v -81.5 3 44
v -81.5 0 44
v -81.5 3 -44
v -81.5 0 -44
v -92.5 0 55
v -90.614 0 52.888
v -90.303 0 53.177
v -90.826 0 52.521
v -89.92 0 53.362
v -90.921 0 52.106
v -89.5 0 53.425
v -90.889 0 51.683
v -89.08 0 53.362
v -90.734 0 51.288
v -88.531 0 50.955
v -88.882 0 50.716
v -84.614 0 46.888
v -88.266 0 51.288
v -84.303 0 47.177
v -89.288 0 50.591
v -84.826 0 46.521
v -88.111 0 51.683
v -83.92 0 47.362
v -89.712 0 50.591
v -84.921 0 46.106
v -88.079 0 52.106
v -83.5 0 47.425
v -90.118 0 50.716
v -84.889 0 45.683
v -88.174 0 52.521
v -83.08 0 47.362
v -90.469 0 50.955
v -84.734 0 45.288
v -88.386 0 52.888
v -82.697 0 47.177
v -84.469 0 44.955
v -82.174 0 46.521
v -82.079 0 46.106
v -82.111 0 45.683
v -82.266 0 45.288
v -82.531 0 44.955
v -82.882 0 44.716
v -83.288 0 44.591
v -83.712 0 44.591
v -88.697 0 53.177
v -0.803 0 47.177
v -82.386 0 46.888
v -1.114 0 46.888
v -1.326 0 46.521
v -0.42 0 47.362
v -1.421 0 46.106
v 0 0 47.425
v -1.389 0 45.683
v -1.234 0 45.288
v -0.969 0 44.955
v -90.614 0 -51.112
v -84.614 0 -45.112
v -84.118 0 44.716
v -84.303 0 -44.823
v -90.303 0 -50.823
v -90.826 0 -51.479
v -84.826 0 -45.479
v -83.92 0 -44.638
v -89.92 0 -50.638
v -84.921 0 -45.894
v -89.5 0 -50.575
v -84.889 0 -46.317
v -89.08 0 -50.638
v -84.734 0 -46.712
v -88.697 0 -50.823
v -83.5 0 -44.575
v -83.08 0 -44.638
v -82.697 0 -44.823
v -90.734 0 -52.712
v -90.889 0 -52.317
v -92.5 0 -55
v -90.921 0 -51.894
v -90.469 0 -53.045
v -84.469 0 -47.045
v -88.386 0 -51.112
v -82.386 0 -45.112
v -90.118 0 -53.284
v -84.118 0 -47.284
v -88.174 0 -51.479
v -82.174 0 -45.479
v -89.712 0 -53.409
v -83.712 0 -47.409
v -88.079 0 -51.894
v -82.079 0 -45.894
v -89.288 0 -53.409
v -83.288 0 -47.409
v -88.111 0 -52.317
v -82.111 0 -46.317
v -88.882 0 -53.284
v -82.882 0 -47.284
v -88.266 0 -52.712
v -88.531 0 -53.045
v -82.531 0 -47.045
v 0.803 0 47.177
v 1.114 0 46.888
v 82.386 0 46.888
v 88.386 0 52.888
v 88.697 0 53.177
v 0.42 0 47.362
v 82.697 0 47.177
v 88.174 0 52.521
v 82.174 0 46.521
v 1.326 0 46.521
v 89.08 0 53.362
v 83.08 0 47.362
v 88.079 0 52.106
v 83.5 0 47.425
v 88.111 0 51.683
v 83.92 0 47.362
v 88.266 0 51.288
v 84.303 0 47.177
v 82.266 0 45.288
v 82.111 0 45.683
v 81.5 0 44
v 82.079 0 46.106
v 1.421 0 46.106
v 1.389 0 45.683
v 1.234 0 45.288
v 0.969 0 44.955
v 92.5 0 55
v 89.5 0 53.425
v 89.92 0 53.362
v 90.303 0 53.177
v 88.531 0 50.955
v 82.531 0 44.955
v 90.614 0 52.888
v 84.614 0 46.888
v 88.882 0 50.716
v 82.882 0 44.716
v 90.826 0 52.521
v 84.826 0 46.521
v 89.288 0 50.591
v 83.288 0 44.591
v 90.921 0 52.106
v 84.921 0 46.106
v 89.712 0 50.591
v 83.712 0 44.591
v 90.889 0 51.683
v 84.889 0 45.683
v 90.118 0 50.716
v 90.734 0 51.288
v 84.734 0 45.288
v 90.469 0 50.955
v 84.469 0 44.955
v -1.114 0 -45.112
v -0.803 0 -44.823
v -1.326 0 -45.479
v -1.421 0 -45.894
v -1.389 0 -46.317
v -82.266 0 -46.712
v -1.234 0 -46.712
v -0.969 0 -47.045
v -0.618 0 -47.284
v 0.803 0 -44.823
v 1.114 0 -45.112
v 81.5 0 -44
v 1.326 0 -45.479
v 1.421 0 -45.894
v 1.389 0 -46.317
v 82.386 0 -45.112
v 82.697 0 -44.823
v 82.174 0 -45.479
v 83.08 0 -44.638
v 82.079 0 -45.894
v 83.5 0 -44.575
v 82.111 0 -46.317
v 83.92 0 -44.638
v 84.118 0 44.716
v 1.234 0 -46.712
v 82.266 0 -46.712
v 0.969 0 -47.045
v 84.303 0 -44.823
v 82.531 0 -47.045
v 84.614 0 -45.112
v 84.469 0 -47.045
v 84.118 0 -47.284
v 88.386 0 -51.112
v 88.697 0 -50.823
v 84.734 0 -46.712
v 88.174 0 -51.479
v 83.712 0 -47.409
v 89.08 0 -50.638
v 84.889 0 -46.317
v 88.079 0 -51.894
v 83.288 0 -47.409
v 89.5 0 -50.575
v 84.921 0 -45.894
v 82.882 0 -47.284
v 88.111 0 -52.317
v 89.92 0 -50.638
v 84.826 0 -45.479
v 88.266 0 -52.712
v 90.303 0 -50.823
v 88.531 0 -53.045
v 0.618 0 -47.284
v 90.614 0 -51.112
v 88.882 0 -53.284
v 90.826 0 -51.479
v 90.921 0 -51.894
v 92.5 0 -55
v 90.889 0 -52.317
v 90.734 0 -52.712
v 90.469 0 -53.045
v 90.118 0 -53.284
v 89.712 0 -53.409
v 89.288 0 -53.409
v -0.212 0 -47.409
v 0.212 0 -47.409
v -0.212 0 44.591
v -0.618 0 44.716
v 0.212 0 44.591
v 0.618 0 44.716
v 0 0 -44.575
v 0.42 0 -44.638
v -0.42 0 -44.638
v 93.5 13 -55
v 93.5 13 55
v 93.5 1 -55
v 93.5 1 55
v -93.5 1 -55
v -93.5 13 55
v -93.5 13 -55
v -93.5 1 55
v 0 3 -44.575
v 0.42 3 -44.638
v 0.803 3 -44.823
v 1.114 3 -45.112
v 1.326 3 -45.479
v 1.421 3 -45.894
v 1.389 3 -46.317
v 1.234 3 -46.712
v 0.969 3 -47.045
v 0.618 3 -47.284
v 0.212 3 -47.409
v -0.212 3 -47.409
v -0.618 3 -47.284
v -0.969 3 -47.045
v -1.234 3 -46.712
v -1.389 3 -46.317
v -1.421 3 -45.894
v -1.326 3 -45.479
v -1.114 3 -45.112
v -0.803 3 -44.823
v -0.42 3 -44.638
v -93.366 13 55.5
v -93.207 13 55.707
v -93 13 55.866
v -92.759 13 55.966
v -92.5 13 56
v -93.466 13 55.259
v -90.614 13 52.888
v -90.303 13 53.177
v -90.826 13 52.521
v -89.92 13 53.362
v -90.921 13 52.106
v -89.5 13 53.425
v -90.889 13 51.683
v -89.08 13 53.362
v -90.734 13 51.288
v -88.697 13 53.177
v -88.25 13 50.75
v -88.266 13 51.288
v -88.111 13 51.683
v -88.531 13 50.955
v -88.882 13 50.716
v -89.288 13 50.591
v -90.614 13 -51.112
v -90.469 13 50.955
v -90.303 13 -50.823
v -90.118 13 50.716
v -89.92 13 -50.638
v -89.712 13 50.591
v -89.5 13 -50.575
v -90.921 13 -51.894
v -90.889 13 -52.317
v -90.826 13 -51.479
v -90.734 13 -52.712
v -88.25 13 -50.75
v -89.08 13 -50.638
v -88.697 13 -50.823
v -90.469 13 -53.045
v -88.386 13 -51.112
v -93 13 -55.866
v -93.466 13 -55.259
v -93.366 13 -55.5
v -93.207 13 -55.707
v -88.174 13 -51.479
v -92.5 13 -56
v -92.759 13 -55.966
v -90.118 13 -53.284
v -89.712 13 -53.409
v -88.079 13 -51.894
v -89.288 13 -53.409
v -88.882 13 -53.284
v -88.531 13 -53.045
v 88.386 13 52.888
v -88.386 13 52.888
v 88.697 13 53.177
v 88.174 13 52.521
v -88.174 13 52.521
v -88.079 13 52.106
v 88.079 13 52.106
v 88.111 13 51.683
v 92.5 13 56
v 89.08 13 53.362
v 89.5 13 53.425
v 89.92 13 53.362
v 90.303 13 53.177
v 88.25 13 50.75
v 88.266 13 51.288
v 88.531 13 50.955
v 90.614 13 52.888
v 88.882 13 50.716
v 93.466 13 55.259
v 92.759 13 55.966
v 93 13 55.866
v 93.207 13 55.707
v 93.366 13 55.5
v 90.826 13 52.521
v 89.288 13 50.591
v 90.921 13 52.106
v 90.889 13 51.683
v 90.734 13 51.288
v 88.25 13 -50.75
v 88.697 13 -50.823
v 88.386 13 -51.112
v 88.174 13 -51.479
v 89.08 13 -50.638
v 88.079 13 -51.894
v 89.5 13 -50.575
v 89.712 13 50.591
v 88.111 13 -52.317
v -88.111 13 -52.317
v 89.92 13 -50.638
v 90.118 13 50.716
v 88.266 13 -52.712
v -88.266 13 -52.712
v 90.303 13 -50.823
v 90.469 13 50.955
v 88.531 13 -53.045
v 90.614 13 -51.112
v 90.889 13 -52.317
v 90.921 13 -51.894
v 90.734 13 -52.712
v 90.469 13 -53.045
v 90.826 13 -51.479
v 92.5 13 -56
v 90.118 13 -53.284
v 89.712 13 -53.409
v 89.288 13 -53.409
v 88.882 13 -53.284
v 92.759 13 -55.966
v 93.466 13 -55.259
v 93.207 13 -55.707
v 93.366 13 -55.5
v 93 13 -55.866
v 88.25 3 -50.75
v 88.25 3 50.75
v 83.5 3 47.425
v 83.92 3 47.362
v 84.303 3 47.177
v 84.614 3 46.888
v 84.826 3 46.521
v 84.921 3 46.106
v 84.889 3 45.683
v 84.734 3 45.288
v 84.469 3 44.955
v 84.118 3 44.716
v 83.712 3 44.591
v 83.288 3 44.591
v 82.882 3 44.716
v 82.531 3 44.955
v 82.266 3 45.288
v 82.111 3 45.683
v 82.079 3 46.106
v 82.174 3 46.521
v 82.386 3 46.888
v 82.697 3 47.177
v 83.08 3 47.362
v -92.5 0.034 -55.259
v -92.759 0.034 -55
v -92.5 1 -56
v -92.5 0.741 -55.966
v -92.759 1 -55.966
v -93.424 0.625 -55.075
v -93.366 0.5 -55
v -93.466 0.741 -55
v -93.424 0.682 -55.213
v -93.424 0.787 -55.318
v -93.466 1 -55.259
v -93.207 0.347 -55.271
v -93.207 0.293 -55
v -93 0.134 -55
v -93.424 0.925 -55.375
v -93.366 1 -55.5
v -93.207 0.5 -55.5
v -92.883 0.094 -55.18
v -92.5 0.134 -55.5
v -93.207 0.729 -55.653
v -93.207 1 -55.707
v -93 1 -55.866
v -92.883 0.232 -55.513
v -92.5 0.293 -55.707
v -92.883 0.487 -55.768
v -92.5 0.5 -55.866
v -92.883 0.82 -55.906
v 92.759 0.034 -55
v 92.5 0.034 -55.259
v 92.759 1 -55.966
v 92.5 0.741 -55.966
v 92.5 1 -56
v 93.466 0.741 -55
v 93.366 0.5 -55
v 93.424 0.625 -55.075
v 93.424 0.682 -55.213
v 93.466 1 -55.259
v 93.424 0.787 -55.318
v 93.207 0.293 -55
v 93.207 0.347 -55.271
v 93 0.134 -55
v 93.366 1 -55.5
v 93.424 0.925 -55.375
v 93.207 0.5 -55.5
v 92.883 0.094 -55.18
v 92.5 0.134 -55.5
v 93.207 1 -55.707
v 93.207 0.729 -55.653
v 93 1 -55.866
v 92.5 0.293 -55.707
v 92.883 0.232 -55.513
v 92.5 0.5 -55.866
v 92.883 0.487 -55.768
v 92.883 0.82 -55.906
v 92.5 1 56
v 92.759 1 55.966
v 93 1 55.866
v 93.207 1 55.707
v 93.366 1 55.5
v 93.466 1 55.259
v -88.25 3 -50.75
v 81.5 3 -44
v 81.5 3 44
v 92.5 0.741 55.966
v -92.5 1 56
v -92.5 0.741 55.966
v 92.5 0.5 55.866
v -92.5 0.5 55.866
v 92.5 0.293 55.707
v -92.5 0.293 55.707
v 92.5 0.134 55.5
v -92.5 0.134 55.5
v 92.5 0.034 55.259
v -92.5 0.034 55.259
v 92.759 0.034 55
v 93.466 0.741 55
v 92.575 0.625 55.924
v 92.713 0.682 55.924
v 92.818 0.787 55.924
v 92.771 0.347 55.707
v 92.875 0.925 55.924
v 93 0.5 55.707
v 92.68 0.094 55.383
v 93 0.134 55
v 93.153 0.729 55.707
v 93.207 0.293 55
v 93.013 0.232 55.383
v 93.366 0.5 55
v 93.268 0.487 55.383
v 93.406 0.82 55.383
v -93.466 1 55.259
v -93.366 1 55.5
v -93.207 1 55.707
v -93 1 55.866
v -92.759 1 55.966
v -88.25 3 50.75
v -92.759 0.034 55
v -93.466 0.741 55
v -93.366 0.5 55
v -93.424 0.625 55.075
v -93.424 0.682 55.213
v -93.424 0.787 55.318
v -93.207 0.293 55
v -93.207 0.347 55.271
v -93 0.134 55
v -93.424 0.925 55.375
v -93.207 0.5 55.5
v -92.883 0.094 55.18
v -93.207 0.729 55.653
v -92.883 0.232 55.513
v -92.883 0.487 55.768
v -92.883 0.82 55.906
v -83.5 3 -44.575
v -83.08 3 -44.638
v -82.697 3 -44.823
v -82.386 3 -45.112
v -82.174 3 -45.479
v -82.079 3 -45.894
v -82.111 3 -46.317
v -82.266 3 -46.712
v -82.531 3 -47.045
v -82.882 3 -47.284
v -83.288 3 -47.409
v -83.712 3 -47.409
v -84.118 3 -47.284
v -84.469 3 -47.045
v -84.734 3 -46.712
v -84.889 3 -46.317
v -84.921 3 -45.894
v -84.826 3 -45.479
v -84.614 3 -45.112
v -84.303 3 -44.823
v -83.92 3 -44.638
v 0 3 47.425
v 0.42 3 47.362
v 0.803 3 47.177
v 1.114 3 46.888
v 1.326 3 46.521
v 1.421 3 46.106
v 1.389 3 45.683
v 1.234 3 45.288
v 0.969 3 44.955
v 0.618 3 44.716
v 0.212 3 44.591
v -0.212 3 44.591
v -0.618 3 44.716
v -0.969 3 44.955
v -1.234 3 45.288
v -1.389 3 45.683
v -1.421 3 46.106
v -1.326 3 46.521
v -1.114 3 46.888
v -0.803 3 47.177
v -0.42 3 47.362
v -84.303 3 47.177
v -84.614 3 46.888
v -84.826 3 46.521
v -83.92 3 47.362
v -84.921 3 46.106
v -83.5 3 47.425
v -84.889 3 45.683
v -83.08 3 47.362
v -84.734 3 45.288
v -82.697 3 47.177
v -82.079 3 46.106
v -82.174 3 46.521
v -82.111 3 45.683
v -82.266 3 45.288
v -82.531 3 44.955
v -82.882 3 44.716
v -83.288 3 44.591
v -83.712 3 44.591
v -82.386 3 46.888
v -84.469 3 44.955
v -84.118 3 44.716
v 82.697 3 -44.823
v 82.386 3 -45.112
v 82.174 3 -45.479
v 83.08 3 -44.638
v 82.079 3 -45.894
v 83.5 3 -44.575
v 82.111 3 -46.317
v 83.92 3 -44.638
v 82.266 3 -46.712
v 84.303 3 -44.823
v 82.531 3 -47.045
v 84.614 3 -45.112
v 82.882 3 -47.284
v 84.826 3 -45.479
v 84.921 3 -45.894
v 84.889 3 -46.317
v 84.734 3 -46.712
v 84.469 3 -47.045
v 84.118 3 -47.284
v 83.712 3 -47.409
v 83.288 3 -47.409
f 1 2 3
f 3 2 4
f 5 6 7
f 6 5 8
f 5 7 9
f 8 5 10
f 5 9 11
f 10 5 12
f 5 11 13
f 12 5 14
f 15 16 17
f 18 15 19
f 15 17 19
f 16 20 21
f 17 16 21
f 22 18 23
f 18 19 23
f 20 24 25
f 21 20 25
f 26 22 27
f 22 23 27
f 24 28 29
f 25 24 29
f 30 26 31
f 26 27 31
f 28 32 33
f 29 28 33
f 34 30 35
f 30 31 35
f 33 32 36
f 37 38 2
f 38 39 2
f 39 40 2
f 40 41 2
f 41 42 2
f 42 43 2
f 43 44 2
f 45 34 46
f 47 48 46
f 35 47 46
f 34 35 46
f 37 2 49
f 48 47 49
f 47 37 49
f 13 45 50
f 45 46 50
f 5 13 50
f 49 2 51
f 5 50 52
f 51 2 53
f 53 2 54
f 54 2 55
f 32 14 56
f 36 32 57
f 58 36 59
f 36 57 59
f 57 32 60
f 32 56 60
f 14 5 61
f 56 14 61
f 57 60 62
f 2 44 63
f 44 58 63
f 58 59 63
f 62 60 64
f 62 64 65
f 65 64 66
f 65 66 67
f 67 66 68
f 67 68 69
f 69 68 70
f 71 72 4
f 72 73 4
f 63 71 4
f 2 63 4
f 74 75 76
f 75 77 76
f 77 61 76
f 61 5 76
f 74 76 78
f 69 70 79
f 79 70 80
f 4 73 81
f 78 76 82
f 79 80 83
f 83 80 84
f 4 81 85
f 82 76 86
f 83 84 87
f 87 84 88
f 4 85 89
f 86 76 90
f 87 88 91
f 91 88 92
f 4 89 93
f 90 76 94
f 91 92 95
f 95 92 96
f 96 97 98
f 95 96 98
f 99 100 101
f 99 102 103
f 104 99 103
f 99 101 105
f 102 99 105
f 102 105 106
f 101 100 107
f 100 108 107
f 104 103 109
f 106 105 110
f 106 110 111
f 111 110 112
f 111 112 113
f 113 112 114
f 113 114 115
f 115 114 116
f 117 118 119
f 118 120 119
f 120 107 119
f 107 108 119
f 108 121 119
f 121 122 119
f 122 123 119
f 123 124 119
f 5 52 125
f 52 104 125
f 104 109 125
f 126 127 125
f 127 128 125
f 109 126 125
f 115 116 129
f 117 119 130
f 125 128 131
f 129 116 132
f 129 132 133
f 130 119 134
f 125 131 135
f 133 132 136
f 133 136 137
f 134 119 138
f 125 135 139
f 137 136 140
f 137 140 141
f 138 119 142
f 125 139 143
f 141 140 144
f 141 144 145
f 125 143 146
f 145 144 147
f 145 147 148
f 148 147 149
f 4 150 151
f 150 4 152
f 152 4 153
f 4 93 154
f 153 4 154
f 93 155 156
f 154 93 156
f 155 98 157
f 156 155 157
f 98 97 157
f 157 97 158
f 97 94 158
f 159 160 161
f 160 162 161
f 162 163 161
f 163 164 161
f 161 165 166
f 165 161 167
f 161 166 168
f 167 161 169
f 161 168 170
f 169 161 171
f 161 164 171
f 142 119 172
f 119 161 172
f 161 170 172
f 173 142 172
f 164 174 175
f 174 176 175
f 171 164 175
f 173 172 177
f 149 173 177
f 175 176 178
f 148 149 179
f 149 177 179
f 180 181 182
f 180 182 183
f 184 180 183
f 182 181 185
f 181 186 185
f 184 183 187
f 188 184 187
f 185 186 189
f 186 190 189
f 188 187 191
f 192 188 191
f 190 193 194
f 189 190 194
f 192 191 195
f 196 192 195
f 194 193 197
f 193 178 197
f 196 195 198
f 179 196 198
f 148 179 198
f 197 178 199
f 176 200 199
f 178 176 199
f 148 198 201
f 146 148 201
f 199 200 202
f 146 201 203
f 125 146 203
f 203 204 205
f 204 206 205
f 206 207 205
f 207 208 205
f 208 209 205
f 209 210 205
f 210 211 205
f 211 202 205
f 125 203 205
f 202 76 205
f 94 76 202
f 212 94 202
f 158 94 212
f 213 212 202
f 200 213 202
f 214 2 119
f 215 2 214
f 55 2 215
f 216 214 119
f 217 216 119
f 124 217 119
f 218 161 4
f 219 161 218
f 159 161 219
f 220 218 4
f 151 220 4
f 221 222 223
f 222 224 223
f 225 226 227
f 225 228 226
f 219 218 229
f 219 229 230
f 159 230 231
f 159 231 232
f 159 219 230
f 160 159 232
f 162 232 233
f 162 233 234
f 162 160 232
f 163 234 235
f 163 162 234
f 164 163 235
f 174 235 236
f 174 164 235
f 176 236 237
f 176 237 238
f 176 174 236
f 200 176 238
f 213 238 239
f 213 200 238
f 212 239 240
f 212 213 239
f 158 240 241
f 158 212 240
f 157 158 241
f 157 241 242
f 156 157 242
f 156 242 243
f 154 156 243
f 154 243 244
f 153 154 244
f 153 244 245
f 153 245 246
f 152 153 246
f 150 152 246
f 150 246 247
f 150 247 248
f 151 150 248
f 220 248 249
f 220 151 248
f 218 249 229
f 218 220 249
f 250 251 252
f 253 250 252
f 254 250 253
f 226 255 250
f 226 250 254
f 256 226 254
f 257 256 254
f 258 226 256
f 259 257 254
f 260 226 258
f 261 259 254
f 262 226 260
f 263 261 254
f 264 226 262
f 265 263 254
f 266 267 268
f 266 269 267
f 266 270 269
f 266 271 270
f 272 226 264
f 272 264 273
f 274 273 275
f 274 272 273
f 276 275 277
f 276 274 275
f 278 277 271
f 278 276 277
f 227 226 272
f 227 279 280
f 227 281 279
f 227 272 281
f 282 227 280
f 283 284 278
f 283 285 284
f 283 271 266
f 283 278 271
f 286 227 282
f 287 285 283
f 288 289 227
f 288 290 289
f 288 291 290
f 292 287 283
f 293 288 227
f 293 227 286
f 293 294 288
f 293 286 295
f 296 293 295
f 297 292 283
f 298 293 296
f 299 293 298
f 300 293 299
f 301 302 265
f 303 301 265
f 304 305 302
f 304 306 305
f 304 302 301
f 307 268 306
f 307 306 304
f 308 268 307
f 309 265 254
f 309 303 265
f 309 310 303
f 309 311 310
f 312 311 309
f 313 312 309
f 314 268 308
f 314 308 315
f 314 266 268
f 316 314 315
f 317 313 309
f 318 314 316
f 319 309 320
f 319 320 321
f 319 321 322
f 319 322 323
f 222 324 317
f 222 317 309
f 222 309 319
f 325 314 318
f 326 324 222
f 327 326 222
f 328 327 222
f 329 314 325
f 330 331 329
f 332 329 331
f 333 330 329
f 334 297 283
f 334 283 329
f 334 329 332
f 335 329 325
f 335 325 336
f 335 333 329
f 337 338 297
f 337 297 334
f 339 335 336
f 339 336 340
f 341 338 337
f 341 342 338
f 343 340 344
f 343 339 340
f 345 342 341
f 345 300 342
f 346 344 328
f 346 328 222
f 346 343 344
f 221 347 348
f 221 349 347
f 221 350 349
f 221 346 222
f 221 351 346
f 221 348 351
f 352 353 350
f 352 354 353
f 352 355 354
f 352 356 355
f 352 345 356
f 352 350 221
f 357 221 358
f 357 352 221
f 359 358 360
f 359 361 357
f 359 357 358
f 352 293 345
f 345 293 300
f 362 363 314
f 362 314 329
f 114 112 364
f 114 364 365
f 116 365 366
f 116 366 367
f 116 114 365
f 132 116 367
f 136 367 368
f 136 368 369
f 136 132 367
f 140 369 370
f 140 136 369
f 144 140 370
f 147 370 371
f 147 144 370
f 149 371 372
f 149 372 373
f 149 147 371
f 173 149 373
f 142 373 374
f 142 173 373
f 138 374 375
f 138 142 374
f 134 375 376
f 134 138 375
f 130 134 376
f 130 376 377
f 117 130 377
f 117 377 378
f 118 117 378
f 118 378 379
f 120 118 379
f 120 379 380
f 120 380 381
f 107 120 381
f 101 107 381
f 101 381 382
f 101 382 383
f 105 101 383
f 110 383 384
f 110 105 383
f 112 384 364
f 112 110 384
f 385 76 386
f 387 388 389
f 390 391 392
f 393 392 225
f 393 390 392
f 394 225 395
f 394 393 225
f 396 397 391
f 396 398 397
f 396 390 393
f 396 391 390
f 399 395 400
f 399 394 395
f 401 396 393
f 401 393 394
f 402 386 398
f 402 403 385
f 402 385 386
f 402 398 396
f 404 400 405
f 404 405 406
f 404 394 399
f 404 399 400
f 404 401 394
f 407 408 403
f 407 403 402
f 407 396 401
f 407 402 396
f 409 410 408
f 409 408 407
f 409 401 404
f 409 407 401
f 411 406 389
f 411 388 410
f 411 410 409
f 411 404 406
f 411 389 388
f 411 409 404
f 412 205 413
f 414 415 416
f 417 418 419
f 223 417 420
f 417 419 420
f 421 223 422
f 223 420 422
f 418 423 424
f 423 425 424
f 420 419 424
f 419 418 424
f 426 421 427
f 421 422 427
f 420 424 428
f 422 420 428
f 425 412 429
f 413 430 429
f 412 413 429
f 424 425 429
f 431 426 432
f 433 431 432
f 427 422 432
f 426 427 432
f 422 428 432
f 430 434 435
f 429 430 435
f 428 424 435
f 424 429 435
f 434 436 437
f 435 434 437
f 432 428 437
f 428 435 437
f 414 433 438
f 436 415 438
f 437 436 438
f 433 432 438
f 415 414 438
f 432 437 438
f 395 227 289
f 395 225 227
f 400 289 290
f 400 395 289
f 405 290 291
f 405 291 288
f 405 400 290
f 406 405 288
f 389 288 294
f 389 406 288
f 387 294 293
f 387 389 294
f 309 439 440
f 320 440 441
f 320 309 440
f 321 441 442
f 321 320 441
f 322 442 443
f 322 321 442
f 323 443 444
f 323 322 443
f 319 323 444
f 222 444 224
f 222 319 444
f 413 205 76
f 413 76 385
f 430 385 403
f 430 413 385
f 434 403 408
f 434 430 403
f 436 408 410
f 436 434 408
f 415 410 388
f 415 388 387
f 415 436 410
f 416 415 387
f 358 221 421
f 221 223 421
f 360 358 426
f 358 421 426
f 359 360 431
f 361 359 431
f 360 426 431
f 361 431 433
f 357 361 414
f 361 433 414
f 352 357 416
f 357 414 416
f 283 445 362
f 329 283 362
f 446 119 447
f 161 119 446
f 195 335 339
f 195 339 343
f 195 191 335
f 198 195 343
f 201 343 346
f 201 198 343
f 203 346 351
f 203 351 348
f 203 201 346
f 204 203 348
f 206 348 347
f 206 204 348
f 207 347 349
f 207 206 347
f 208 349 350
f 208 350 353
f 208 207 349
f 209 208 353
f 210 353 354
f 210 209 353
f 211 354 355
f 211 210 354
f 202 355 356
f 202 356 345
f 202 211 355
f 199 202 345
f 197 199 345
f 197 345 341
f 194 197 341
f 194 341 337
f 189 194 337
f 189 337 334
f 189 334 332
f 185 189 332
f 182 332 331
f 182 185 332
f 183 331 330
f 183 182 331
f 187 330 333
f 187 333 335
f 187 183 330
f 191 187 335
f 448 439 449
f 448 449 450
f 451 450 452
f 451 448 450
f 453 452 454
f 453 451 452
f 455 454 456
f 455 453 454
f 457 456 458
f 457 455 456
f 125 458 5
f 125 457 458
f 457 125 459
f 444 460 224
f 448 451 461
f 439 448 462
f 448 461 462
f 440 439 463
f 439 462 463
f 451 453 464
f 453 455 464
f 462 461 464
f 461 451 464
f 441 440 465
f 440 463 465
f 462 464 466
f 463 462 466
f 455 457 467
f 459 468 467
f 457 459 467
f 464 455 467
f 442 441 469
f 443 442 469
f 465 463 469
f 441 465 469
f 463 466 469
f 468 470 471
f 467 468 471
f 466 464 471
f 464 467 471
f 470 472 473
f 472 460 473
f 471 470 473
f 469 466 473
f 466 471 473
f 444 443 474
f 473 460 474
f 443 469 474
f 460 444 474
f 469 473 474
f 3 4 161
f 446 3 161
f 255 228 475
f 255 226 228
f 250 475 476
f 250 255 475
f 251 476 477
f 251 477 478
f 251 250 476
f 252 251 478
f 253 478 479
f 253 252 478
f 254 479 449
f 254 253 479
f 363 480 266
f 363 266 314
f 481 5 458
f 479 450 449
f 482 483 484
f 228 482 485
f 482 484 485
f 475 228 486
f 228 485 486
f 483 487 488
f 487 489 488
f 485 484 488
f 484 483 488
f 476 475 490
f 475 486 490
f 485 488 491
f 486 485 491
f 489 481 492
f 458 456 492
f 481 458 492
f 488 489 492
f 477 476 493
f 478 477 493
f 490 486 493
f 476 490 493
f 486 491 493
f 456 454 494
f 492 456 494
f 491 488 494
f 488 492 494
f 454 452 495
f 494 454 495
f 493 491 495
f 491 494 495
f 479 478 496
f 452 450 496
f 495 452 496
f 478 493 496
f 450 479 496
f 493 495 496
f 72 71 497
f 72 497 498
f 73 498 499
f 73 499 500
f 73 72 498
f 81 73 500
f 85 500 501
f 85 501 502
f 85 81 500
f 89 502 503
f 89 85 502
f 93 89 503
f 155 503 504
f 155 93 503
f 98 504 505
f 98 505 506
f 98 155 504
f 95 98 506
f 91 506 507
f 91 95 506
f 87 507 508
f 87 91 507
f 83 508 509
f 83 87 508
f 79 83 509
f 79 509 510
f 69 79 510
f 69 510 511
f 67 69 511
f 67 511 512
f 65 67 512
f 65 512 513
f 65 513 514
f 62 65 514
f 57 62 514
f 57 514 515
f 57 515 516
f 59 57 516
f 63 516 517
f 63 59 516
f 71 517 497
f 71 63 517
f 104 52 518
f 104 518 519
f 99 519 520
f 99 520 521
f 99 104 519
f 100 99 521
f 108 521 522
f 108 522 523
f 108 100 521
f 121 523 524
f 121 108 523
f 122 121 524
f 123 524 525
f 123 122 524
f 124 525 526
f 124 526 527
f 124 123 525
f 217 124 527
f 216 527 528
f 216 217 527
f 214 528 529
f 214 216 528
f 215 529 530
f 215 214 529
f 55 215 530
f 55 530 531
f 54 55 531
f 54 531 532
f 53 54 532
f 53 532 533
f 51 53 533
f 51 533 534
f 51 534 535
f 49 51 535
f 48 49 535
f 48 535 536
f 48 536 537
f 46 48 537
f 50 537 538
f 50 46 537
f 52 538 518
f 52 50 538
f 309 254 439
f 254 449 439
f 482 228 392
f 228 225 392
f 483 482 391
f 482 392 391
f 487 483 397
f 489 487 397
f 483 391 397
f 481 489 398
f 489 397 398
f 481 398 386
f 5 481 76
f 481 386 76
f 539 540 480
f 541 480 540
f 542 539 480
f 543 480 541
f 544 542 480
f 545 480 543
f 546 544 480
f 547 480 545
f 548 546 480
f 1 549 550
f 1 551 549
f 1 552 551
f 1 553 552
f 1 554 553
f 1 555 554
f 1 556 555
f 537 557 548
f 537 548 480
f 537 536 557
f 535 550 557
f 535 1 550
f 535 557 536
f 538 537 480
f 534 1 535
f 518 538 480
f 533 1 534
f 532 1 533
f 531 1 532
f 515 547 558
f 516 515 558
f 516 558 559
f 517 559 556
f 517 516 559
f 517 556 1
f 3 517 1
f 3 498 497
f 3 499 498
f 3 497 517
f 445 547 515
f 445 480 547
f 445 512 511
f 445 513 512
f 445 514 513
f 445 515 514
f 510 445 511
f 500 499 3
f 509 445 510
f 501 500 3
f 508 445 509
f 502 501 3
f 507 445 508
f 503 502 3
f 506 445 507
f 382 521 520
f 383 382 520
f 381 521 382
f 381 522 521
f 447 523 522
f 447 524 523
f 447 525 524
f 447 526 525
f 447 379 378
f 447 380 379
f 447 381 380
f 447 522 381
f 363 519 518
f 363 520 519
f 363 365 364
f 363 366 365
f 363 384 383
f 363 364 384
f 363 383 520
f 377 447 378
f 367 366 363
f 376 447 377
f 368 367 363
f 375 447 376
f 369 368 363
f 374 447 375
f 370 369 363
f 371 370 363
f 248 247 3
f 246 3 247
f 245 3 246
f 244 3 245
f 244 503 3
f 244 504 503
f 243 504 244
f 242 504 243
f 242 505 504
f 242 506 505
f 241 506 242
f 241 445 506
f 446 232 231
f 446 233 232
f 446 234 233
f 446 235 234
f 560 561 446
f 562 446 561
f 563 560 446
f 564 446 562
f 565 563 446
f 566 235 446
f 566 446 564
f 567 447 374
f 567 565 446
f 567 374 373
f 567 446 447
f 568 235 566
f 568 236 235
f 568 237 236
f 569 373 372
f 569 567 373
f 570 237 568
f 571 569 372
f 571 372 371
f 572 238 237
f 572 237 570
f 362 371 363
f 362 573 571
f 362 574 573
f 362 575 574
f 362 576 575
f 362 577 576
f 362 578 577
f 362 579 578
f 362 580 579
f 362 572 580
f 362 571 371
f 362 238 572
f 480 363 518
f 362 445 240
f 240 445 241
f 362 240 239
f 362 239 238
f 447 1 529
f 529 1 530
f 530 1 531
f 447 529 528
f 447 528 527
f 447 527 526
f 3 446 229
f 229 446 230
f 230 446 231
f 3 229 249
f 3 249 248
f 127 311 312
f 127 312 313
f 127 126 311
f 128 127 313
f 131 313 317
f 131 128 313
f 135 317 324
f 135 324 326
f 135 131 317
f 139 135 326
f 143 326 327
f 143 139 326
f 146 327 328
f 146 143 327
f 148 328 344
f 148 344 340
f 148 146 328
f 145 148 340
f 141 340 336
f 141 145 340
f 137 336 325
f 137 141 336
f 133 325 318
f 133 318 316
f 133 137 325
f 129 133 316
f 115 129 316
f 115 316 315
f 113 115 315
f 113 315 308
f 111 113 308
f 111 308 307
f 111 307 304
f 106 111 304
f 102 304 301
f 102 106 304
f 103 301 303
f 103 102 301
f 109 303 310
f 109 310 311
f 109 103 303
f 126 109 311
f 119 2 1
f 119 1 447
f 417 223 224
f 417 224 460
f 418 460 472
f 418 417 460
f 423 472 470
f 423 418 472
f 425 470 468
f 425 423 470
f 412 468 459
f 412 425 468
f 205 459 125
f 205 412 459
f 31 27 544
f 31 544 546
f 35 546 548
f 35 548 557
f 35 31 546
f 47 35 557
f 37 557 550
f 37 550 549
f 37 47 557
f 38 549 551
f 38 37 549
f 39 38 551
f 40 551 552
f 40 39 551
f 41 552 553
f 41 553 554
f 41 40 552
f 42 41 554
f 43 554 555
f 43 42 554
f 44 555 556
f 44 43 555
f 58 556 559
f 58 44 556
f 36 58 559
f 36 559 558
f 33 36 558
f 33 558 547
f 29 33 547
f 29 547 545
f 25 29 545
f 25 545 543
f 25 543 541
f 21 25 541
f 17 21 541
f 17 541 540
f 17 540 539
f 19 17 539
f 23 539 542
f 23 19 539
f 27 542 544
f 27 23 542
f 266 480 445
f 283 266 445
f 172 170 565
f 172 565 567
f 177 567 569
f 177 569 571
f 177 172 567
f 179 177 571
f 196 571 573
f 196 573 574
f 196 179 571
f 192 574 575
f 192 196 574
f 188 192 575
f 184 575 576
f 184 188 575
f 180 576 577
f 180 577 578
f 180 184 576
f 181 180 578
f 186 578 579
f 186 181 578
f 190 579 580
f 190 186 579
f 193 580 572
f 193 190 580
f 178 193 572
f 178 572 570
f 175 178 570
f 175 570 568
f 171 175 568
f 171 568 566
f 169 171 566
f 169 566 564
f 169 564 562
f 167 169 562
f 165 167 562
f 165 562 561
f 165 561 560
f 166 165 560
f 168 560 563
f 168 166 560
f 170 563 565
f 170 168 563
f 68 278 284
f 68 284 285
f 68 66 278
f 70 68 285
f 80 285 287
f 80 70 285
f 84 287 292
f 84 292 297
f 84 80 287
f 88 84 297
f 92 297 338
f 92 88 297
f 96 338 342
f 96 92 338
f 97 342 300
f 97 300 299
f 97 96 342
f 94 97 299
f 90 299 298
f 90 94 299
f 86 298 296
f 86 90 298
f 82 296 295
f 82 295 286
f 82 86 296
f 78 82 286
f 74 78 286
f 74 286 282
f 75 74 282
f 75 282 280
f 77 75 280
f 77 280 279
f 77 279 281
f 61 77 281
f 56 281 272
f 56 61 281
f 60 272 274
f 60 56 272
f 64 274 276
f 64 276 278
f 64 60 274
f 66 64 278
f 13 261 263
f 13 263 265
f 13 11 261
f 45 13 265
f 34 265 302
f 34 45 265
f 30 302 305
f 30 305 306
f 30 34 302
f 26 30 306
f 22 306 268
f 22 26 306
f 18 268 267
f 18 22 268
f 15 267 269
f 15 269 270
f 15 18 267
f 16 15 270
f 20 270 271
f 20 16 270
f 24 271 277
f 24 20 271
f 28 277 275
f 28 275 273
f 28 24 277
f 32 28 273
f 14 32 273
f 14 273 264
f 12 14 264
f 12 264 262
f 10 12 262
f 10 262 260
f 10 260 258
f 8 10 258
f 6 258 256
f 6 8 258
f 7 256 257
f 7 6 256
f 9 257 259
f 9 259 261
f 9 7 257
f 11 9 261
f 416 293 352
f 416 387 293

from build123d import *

# Parameters (mm, degrees)
SKETCH1_W    = 187
SKETCH1_H    = 112
SKETCH1_R    = 1.425
SKETCH1_W_2  = 163
SKETCH1_H_2  = 88
BASE_DEPTH   = 3
SKETCH3_W    = 187
SKETCH3_H    = 112
SKETCH3_R    = 1.425
SKETCH3_W_2  = 176.5
SKETCH3_H_2  = 101.5
EDGE_2_DEPTH = 10
FILLET1_R    = 1


with BuildPart() as part:
    # Sketch1 → Base (new body)
    with BuildSketch(Plane(origin=(0, 0, 0), x_dir=(1, 0, 0), z_dir=(0, 1, 0))):
        Rectangle(SKETCH1_W, SKETCH1_H)
        with Locations((-89.5, -52)):
            Circle(SKETCH1_R, mode=Mode.SUBTRACT)
        with Locations((89.5, -52)):
            Circle(SKETCH1_R, mode=Mode.SUBTRACT)
        with Locations((89.5, 52)):
            Circle(SKETCH1_R, mode=Mode.SUBTRACT)
        with Locations((-89.5, 52)):
            Circle(SKETCH1_R, mode=Mode.SUBTRACT)
        with Locations((-83.5, -46)):
            Circle(SKETCH1_R, mode=Mode.SUBTRACT)
        with Locations((0, -46)):
            Circle(SKETCH1_R, mode=Mode.SUBTRACT)
        with Locations((83.5, -46)):
            Circle(SKETCH1_R, mode=Mode.SUBTRACT)
        with Locations((0, 46)):
            Circle(SKETCH1_R, mode=Mode.SUBTRACT)
        with Locations((83.5, 46)):
            Circle(SKETCH1_R, mode=Mode.SUBTRACT)
        with Locations((-83.5, 46)):
            Circle(SKETCH1_R, mode=Mode.SUBTRACT)
        Rectangle(SKETCH1_W_2, SKETCH1_H_2, mode=Mode.SUBTRACT)
    extrude(amount=BASE_DEPTH)

    # Sketch3 → Edge 2 (add)
    with BuildSketch(Plane(origin=(0, 3, 0), x_dir=(1, 0, 0), z_dir=(0, 1, 0))):
        Rectangle(SKETCH3_W, SKETCH3_H)
        with Locations((-89.5, -52)):
            Circle(SKETCH3_R, mode=Mode.SUBTRACT)
        with Locations((89.5, -52)):
            Circle(SKETCH3_R, mode=Mode.SUBTRACT)
        with Locations((89.5, 52)):
            Circle(SKETCH3_R, mode=Mode.SUBTRACT)
        with Locations((-89.5, 52)):
            Circle(SKETCH3_R, mode=Mode.SUBTRACT)
        Rectangle(SKETCH3_W_2, SKETCH3_H_2, mode=Mode.SUBTRACT)
    extrude(amount=EDGE_2_DEPTH)

    # Fillet1
    fillet1_edges = [part.edges().sort_by_distance(p)[0] for p in [
        (0, 0, 56),
        (93.5, 6.5, 56),
        (93.5, 0, 0),
        (93.5, 6.5, -56),
        (0, 0, -56),
        (-93.5, 0, 0),
        (-93.5, 6.5, -56),
        (-93.5, 6.5, 56),
    ]]
    fillet(fillet1_edges, radius=FILLET1_R)


solid = part.part
